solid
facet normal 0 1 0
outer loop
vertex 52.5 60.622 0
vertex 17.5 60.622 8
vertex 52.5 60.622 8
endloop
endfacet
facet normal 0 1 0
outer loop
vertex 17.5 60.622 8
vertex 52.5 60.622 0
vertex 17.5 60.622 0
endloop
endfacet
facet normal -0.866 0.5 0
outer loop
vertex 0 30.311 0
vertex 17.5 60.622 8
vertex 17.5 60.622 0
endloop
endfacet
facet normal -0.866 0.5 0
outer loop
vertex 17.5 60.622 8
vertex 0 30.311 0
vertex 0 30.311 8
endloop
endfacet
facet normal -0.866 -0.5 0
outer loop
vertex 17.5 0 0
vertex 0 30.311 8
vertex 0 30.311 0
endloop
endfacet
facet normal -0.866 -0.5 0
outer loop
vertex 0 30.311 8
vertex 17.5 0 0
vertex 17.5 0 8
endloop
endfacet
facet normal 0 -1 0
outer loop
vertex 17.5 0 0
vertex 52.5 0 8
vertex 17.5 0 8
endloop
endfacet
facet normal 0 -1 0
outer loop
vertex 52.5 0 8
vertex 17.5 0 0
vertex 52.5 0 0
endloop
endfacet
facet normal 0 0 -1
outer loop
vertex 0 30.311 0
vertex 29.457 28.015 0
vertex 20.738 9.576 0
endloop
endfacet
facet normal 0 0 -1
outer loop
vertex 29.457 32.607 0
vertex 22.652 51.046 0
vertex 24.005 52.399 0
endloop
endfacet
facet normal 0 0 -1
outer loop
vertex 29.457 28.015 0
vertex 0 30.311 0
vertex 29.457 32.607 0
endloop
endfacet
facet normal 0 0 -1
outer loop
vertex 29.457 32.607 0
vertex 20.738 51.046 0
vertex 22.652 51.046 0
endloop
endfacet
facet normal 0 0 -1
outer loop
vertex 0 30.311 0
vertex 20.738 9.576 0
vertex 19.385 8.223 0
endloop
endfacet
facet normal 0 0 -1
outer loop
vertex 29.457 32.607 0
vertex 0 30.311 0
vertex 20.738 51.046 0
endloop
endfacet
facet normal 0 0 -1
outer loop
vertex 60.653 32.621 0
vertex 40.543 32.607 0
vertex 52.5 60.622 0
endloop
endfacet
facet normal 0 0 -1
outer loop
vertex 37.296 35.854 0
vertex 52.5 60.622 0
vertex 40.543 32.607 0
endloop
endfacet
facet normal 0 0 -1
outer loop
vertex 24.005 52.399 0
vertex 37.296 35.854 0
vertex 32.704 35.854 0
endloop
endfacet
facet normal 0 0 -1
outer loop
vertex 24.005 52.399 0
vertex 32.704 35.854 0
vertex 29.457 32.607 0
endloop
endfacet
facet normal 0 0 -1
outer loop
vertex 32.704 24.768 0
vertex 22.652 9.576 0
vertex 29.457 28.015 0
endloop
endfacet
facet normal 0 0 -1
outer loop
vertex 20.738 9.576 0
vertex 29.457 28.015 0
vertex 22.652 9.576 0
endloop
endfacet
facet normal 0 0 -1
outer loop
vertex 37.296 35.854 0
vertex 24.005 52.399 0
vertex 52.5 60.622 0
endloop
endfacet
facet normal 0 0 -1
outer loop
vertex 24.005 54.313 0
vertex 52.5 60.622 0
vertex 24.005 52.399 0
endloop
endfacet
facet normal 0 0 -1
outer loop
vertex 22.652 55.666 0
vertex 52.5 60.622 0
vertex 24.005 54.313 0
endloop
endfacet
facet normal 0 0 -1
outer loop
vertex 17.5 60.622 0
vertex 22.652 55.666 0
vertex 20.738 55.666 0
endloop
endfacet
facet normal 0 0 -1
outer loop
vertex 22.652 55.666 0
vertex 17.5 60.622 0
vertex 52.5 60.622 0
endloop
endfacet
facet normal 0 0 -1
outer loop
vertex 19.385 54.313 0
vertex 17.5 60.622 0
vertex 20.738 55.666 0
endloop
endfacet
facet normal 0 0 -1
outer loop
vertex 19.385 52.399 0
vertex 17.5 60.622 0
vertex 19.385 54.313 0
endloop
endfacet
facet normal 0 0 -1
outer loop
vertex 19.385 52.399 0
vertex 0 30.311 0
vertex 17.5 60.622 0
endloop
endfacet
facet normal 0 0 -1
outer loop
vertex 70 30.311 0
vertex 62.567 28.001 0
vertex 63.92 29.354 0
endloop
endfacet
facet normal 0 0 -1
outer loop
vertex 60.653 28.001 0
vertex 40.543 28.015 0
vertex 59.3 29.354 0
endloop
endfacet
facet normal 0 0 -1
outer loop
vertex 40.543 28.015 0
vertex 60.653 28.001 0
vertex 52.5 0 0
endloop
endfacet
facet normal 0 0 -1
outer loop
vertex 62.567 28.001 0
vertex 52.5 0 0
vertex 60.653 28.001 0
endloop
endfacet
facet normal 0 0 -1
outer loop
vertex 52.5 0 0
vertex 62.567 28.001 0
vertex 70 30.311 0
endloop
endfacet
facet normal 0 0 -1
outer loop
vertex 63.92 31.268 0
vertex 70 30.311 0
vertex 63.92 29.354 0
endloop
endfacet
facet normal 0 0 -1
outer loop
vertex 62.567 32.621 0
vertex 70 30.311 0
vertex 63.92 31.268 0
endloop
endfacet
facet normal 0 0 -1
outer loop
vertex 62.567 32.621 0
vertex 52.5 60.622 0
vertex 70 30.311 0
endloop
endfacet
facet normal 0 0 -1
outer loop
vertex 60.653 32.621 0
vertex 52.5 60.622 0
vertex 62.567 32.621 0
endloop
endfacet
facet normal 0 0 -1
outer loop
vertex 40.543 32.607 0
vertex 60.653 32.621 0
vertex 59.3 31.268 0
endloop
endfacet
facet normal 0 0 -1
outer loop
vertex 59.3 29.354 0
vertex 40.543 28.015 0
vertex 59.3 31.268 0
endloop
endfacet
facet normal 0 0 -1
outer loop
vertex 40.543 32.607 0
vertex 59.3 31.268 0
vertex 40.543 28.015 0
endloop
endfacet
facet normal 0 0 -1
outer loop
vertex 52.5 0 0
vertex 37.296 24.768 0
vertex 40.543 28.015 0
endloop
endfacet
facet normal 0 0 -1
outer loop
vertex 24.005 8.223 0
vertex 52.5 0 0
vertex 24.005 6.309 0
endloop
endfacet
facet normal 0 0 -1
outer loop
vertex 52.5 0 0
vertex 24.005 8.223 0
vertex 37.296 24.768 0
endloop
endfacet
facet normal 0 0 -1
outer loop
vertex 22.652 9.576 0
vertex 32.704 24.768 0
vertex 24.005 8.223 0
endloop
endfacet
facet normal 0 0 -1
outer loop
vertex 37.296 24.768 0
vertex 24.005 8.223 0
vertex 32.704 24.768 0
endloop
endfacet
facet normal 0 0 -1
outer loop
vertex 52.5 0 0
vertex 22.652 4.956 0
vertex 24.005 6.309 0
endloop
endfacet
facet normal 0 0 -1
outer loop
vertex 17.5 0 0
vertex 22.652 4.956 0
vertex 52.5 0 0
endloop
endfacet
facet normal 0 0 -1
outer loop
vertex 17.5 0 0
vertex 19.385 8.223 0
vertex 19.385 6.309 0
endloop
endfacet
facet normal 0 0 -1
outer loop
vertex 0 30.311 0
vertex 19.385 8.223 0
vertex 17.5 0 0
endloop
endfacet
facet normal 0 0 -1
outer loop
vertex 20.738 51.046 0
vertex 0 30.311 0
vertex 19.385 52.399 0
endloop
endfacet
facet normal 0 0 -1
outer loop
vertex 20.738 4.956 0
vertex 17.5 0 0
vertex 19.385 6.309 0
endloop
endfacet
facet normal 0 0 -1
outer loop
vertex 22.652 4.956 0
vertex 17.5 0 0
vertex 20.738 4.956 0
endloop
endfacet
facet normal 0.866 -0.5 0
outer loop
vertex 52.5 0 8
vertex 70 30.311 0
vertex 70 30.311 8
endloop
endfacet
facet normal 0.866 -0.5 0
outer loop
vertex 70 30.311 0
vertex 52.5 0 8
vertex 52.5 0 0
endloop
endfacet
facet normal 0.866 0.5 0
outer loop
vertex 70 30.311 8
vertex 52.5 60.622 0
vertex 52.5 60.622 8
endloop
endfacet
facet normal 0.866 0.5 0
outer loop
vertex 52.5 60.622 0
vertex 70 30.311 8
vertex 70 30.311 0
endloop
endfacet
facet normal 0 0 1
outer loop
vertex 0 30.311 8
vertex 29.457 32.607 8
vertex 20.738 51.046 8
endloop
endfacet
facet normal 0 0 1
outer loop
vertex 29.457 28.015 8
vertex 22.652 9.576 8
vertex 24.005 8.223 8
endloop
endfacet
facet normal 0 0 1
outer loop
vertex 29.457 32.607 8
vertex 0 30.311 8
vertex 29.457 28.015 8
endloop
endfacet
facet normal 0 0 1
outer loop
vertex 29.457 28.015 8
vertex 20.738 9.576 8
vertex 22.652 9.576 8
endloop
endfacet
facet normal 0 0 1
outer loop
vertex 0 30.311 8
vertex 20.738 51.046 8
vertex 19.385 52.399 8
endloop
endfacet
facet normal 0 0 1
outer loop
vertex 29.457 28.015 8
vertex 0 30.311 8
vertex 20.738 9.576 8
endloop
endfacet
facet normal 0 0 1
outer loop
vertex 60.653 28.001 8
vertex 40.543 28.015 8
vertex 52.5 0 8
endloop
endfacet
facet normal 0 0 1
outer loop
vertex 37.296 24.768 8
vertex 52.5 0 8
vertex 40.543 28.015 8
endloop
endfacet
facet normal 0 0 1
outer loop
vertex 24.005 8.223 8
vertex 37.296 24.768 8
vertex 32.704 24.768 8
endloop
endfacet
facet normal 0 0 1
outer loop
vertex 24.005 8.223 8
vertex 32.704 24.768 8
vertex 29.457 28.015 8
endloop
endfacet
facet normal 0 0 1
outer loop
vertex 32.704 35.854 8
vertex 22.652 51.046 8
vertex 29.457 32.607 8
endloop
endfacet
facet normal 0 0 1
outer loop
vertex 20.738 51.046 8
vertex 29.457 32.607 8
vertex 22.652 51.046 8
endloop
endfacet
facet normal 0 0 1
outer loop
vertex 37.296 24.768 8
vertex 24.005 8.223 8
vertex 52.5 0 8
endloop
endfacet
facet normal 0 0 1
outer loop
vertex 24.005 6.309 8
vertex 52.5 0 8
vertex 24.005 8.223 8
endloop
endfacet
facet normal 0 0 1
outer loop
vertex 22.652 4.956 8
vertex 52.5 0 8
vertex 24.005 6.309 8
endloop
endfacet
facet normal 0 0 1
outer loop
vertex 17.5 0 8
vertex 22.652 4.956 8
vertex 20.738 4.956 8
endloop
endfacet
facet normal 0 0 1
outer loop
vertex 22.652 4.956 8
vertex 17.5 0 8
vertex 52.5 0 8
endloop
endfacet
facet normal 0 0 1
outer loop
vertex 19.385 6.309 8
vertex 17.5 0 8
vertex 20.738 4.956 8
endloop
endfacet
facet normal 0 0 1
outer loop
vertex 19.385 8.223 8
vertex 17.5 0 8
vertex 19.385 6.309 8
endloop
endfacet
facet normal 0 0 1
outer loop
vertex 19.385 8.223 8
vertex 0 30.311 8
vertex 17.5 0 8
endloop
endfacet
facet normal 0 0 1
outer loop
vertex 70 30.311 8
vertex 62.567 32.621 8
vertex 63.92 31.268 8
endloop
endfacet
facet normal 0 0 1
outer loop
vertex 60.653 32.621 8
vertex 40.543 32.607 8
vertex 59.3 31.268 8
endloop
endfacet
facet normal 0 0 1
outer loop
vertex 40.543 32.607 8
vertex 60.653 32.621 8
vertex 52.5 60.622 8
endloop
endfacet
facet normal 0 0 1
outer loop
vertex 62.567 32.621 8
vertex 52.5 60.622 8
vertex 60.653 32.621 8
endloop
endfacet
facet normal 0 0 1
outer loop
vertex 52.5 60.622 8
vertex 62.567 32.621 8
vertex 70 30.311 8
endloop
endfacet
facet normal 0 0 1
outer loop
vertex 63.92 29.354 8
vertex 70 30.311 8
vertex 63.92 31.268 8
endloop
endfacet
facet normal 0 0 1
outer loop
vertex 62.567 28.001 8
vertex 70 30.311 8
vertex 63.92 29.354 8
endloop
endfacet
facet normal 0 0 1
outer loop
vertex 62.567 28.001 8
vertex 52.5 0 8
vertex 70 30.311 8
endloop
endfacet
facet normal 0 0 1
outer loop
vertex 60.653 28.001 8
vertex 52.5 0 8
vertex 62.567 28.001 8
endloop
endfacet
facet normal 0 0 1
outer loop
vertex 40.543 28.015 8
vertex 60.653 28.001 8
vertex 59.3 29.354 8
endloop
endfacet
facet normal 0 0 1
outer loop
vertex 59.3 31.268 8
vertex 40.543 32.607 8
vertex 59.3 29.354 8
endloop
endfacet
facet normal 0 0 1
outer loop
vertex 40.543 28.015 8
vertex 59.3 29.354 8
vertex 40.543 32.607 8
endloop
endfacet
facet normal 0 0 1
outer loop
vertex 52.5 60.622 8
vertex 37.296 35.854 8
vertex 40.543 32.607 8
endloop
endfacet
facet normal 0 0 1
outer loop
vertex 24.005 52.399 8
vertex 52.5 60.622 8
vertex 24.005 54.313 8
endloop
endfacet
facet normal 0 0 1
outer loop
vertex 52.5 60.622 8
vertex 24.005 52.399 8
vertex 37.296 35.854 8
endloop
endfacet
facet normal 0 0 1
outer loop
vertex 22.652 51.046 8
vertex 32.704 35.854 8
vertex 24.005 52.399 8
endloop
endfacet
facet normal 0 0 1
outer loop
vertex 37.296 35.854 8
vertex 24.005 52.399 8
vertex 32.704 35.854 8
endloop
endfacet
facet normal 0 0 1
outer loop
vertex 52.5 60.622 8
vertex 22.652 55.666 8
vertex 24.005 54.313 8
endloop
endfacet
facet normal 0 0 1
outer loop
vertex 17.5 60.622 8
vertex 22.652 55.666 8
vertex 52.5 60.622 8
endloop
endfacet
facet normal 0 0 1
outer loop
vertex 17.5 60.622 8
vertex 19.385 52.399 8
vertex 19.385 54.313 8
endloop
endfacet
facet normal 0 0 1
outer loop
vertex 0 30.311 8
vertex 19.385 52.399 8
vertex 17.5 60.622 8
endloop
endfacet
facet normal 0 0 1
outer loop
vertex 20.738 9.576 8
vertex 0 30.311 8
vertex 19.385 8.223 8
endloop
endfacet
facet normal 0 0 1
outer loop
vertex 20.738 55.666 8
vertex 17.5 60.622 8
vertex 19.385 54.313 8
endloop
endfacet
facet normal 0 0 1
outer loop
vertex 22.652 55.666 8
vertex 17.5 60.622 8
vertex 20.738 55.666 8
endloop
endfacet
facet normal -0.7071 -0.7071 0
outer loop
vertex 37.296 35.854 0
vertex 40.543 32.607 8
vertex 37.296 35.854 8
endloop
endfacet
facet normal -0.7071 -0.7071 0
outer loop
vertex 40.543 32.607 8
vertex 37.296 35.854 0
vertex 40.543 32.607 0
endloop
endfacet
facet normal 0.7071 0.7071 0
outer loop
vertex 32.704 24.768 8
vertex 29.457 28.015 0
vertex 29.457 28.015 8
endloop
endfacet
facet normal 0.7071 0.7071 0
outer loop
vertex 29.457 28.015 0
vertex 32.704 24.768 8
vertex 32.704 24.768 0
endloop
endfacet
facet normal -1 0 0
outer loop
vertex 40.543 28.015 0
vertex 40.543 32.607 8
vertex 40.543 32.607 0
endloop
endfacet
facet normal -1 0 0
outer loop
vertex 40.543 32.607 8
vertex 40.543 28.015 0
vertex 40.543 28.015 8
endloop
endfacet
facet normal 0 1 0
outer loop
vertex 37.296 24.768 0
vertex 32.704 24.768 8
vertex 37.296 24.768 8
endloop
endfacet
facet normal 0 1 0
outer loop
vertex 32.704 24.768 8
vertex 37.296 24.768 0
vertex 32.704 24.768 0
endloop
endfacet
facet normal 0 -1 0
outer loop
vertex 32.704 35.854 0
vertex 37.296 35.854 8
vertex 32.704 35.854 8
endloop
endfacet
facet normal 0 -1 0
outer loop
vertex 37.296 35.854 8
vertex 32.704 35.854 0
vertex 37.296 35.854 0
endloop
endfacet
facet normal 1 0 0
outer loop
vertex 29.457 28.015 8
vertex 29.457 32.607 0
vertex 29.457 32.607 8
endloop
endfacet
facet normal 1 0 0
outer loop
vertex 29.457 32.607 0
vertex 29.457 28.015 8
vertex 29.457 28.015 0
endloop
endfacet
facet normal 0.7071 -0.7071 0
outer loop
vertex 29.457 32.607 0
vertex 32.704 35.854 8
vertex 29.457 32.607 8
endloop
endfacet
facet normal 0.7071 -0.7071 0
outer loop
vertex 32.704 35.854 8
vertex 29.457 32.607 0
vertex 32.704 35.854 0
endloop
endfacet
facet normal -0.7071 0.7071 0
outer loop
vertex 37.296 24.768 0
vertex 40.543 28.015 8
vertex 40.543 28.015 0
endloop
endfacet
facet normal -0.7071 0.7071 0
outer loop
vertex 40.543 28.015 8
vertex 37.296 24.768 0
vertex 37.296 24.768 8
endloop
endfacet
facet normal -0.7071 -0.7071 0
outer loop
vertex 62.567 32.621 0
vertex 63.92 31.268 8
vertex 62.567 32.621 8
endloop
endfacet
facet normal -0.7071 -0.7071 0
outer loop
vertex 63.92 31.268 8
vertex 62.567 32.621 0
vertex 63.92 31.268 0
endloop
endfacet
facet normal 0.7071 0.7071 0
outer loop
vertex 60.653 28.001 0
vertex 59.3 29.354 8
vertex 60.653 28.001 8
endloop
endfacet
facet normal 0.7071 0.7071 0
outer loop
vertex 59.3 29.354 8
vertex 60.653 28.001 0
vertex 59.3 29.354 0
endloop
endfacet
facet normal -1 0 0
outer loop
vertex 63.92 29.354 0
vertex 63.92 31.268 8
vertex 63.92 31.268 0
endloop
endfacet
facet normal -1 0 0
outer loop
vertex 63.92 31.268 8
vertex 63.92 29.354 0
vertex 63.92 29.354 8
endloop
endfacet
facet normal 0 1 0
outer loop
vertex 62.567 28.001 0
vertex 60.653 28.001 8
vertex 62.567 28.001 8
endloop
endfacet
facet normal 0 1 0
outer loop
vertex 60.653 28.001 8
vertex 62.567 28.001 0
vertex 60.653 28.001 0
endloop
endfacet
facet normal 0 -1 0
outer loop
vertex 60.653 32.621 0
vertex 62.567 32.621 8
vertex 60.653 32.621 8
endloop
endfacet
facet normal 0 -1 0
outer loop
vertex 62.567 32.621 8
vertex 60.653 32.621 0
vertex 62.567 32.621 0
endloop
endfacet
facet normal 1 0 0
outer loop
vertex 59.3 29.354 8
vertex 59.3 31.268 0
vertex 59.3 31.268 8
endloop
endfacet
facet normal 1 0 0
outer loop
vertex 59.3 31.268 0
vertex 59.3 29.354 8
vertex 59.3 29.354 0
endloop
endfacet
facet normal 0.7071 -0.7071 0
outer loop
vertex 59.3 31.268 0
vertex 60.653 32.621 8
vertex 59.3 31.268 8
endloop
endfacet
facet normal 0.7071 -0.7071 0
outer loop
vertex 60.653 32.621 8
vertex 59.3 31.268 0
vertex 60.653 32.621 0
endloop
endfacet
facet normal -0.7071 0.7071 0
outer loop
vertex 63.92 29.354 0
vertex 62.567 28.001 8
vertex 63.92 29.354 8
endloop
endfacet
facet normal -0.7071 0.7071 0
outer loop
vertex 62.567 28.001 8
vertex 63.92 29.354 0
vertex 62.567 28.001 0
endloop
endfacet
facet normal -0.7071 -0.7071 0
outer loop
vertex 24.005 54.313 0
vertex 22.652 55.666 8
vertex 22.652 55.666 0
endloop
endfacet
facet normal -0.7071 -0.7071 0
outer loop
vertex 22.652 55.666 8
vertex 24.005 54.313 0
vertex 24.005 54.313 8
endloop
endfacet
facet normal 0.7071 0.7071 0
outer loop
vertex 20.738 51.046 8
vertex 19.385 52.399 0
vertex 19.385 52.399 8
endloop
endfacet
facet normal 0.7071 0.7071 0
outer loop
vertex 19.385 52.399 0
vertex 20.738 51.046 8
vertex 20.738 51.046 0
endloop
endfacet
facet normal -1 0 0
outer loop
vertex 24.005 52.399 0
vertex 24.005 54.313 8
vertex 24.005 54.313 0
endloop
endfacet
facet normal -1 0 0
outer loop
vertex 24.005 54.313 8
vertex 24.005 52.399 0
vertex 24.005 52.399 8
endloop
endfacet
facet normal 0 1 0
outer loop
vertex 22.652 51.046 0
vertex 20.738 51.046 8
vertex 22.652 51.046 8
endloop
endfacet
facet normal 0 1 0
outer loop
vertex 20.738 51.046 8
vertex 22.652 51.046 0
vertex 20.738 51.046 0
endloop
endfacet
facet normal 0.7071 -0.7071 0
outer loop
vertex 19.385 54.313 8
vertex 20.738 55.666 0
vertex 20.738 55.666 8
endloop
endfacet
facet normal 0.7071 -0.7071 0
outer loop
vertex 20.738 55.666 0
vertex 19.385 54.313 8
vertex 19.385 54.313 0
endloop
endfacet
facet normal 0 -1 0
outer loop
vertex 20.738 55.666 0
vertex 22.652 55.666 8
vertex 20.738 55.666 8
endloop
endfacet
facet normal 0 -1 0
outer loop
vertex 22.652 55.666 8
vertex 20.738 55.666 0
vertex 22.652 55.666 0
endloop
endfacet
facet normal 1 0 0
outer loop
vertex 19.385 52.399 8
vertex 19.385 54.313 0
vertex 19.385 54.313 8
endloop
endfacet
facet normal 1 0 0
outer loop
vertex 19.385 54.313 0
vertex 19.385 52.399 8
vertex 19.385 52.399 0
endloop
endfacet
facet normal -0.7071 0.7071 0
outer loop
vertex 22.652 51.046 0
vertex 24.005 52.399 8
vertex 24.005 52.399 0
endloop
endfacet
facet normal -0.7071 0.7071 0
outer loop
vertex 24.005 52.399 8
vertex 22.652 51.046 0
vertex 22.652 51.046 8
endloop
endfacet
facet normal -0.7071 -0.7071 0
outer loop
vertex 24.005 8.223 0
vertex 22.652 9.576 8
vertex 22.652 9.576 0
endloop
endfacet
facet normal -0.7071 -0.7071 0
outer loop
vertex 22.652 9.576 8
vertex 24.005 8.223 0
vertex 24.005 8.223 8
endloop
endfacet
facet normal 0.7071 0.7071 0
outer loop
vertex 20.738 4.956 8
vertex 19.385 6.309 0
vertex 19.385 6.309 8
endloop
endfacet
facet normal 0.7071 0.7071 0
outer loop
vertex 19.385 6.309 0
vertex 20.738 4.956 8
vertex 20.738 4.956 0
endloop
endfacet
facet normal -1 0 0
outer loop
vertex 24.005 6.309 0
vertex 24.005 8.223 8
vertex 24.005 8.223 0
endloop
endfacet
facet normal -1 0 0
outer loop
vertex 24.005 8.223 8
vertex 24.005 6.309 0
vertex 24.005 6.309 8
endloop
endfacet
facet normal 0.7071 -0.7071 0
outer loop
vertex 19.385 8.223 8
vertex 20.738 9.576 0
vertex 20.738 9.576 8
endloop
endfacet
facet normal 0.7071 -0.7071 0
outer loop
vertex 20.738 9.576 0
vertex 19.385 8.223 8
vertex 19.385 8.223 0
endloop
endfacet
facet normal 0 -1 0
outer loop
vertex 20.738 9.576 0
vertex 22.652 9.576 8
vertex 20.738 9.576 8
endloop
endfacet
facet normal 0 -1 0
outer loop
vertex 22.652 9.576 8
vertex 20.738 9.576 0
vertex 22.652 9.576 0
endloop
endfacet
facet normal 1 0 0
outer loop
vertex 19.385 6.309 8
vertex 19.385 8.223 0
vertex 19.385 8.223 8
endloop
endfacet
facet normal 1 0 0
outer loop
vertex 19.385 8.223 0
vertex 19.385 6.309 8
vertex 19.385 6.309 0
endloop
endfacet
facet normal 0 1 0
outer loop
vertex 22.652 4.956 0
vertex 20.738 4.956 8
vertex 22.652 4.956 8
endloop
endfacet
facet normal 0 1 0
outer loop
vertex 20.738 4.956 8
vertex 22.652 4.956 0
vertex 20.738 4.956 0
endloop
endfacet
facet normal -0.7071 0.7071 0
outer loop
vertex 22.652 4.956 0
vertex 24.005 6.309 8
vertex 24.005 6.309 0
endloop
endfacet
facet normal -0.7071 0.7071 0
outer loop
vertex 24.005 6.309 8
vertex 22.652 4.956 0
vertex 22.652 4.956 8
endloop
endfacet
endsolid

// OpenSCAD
$fn = 32;

// ----------------------------------------------------------------------
// Polygon plate: 6-gon R35, 3 bolt windows
// ----------------------------------------------------------------------

// --- parameters (mm) ---
sides = 6;                // number of polygon sides
plate_r = 35;             // circumscribed radius of the polygon
bore_r = 6;               // centre bore radius
bolts = 3;                // number of bolt windows
ring_r = 26.61;           // bolt-circle radius
bolt_r = 2.5;             // bolt window radius
plate_t = 8;              // plate thickness, Z (extrusion height)

plate_d = 2 * plate_r;  // circumscribed diameter
bore_d = 2 * bore_r;  // centre bore diameter
bolt_d = 2 * bolt_r;  // bolt window diameter
ring_d = 2 * ring_r;  // bolt-circle diameter

profile = [[70, 30.311], [52.5, 60.622], [17.5, 60.622], [0, 30.311], [17.5, 0], [52.5, 0]];  // primary outline, 6 points, counter clockwise
void_1 = [[40.543, 32.607], [37.296, 35.854], [32.704, 35.854], [29.457, 32.607], [29.457, 28.015], [32.704, 24.768], [37.296, 24.768], [40.543, 28.015]];  // centre bore, 8 points
void_2 = [[63.92, 31.268], [62.567, 32.621], [60.653, 32.621], [59.3, 31.268], [59.3, 29.354], [60.653, 28.001], [62.567, 28.001], [63.92, 29.354]];  // bolt window 1, 8 points
void_3 = [[24.005, 54.313], [22.652, 55.666], [20.738, 55.666], [19.385, 54.313], [19.385, 52.399], [20.738, 51.046], [22.652, 51.046], [24.005, 52.399]];  // bolt window 2, 8 points
void_4 = [[24.005, 8.223], [22.652, 9.576], [20.738, 9.576], [19.385, 8.223], [19.385, 6.309], [20.738, 4.956], [22.652, 4.956], [24.005, 6.309]];  // bolt window 3, 8 points

// --- the one profile operation ---
difference() {
  linear_extrude(height = plate_t) polygon(points = profile);
  translate([0, 0, -1])
    linear_extrude(height = plate_t + 2) polygon(points = void_1);
  translate([0, 0, -1])
    linear_extrude(height = plate_t + 2) polygon(points = void_2);
  translate([0, 0, -1])
    linear_extrude(height = plate_t + 2) polygon(points = void_3);
  translate([0, 0, -1])
    linear_extrude(height = plate_t + 2) polygon(points = void_4);
}
